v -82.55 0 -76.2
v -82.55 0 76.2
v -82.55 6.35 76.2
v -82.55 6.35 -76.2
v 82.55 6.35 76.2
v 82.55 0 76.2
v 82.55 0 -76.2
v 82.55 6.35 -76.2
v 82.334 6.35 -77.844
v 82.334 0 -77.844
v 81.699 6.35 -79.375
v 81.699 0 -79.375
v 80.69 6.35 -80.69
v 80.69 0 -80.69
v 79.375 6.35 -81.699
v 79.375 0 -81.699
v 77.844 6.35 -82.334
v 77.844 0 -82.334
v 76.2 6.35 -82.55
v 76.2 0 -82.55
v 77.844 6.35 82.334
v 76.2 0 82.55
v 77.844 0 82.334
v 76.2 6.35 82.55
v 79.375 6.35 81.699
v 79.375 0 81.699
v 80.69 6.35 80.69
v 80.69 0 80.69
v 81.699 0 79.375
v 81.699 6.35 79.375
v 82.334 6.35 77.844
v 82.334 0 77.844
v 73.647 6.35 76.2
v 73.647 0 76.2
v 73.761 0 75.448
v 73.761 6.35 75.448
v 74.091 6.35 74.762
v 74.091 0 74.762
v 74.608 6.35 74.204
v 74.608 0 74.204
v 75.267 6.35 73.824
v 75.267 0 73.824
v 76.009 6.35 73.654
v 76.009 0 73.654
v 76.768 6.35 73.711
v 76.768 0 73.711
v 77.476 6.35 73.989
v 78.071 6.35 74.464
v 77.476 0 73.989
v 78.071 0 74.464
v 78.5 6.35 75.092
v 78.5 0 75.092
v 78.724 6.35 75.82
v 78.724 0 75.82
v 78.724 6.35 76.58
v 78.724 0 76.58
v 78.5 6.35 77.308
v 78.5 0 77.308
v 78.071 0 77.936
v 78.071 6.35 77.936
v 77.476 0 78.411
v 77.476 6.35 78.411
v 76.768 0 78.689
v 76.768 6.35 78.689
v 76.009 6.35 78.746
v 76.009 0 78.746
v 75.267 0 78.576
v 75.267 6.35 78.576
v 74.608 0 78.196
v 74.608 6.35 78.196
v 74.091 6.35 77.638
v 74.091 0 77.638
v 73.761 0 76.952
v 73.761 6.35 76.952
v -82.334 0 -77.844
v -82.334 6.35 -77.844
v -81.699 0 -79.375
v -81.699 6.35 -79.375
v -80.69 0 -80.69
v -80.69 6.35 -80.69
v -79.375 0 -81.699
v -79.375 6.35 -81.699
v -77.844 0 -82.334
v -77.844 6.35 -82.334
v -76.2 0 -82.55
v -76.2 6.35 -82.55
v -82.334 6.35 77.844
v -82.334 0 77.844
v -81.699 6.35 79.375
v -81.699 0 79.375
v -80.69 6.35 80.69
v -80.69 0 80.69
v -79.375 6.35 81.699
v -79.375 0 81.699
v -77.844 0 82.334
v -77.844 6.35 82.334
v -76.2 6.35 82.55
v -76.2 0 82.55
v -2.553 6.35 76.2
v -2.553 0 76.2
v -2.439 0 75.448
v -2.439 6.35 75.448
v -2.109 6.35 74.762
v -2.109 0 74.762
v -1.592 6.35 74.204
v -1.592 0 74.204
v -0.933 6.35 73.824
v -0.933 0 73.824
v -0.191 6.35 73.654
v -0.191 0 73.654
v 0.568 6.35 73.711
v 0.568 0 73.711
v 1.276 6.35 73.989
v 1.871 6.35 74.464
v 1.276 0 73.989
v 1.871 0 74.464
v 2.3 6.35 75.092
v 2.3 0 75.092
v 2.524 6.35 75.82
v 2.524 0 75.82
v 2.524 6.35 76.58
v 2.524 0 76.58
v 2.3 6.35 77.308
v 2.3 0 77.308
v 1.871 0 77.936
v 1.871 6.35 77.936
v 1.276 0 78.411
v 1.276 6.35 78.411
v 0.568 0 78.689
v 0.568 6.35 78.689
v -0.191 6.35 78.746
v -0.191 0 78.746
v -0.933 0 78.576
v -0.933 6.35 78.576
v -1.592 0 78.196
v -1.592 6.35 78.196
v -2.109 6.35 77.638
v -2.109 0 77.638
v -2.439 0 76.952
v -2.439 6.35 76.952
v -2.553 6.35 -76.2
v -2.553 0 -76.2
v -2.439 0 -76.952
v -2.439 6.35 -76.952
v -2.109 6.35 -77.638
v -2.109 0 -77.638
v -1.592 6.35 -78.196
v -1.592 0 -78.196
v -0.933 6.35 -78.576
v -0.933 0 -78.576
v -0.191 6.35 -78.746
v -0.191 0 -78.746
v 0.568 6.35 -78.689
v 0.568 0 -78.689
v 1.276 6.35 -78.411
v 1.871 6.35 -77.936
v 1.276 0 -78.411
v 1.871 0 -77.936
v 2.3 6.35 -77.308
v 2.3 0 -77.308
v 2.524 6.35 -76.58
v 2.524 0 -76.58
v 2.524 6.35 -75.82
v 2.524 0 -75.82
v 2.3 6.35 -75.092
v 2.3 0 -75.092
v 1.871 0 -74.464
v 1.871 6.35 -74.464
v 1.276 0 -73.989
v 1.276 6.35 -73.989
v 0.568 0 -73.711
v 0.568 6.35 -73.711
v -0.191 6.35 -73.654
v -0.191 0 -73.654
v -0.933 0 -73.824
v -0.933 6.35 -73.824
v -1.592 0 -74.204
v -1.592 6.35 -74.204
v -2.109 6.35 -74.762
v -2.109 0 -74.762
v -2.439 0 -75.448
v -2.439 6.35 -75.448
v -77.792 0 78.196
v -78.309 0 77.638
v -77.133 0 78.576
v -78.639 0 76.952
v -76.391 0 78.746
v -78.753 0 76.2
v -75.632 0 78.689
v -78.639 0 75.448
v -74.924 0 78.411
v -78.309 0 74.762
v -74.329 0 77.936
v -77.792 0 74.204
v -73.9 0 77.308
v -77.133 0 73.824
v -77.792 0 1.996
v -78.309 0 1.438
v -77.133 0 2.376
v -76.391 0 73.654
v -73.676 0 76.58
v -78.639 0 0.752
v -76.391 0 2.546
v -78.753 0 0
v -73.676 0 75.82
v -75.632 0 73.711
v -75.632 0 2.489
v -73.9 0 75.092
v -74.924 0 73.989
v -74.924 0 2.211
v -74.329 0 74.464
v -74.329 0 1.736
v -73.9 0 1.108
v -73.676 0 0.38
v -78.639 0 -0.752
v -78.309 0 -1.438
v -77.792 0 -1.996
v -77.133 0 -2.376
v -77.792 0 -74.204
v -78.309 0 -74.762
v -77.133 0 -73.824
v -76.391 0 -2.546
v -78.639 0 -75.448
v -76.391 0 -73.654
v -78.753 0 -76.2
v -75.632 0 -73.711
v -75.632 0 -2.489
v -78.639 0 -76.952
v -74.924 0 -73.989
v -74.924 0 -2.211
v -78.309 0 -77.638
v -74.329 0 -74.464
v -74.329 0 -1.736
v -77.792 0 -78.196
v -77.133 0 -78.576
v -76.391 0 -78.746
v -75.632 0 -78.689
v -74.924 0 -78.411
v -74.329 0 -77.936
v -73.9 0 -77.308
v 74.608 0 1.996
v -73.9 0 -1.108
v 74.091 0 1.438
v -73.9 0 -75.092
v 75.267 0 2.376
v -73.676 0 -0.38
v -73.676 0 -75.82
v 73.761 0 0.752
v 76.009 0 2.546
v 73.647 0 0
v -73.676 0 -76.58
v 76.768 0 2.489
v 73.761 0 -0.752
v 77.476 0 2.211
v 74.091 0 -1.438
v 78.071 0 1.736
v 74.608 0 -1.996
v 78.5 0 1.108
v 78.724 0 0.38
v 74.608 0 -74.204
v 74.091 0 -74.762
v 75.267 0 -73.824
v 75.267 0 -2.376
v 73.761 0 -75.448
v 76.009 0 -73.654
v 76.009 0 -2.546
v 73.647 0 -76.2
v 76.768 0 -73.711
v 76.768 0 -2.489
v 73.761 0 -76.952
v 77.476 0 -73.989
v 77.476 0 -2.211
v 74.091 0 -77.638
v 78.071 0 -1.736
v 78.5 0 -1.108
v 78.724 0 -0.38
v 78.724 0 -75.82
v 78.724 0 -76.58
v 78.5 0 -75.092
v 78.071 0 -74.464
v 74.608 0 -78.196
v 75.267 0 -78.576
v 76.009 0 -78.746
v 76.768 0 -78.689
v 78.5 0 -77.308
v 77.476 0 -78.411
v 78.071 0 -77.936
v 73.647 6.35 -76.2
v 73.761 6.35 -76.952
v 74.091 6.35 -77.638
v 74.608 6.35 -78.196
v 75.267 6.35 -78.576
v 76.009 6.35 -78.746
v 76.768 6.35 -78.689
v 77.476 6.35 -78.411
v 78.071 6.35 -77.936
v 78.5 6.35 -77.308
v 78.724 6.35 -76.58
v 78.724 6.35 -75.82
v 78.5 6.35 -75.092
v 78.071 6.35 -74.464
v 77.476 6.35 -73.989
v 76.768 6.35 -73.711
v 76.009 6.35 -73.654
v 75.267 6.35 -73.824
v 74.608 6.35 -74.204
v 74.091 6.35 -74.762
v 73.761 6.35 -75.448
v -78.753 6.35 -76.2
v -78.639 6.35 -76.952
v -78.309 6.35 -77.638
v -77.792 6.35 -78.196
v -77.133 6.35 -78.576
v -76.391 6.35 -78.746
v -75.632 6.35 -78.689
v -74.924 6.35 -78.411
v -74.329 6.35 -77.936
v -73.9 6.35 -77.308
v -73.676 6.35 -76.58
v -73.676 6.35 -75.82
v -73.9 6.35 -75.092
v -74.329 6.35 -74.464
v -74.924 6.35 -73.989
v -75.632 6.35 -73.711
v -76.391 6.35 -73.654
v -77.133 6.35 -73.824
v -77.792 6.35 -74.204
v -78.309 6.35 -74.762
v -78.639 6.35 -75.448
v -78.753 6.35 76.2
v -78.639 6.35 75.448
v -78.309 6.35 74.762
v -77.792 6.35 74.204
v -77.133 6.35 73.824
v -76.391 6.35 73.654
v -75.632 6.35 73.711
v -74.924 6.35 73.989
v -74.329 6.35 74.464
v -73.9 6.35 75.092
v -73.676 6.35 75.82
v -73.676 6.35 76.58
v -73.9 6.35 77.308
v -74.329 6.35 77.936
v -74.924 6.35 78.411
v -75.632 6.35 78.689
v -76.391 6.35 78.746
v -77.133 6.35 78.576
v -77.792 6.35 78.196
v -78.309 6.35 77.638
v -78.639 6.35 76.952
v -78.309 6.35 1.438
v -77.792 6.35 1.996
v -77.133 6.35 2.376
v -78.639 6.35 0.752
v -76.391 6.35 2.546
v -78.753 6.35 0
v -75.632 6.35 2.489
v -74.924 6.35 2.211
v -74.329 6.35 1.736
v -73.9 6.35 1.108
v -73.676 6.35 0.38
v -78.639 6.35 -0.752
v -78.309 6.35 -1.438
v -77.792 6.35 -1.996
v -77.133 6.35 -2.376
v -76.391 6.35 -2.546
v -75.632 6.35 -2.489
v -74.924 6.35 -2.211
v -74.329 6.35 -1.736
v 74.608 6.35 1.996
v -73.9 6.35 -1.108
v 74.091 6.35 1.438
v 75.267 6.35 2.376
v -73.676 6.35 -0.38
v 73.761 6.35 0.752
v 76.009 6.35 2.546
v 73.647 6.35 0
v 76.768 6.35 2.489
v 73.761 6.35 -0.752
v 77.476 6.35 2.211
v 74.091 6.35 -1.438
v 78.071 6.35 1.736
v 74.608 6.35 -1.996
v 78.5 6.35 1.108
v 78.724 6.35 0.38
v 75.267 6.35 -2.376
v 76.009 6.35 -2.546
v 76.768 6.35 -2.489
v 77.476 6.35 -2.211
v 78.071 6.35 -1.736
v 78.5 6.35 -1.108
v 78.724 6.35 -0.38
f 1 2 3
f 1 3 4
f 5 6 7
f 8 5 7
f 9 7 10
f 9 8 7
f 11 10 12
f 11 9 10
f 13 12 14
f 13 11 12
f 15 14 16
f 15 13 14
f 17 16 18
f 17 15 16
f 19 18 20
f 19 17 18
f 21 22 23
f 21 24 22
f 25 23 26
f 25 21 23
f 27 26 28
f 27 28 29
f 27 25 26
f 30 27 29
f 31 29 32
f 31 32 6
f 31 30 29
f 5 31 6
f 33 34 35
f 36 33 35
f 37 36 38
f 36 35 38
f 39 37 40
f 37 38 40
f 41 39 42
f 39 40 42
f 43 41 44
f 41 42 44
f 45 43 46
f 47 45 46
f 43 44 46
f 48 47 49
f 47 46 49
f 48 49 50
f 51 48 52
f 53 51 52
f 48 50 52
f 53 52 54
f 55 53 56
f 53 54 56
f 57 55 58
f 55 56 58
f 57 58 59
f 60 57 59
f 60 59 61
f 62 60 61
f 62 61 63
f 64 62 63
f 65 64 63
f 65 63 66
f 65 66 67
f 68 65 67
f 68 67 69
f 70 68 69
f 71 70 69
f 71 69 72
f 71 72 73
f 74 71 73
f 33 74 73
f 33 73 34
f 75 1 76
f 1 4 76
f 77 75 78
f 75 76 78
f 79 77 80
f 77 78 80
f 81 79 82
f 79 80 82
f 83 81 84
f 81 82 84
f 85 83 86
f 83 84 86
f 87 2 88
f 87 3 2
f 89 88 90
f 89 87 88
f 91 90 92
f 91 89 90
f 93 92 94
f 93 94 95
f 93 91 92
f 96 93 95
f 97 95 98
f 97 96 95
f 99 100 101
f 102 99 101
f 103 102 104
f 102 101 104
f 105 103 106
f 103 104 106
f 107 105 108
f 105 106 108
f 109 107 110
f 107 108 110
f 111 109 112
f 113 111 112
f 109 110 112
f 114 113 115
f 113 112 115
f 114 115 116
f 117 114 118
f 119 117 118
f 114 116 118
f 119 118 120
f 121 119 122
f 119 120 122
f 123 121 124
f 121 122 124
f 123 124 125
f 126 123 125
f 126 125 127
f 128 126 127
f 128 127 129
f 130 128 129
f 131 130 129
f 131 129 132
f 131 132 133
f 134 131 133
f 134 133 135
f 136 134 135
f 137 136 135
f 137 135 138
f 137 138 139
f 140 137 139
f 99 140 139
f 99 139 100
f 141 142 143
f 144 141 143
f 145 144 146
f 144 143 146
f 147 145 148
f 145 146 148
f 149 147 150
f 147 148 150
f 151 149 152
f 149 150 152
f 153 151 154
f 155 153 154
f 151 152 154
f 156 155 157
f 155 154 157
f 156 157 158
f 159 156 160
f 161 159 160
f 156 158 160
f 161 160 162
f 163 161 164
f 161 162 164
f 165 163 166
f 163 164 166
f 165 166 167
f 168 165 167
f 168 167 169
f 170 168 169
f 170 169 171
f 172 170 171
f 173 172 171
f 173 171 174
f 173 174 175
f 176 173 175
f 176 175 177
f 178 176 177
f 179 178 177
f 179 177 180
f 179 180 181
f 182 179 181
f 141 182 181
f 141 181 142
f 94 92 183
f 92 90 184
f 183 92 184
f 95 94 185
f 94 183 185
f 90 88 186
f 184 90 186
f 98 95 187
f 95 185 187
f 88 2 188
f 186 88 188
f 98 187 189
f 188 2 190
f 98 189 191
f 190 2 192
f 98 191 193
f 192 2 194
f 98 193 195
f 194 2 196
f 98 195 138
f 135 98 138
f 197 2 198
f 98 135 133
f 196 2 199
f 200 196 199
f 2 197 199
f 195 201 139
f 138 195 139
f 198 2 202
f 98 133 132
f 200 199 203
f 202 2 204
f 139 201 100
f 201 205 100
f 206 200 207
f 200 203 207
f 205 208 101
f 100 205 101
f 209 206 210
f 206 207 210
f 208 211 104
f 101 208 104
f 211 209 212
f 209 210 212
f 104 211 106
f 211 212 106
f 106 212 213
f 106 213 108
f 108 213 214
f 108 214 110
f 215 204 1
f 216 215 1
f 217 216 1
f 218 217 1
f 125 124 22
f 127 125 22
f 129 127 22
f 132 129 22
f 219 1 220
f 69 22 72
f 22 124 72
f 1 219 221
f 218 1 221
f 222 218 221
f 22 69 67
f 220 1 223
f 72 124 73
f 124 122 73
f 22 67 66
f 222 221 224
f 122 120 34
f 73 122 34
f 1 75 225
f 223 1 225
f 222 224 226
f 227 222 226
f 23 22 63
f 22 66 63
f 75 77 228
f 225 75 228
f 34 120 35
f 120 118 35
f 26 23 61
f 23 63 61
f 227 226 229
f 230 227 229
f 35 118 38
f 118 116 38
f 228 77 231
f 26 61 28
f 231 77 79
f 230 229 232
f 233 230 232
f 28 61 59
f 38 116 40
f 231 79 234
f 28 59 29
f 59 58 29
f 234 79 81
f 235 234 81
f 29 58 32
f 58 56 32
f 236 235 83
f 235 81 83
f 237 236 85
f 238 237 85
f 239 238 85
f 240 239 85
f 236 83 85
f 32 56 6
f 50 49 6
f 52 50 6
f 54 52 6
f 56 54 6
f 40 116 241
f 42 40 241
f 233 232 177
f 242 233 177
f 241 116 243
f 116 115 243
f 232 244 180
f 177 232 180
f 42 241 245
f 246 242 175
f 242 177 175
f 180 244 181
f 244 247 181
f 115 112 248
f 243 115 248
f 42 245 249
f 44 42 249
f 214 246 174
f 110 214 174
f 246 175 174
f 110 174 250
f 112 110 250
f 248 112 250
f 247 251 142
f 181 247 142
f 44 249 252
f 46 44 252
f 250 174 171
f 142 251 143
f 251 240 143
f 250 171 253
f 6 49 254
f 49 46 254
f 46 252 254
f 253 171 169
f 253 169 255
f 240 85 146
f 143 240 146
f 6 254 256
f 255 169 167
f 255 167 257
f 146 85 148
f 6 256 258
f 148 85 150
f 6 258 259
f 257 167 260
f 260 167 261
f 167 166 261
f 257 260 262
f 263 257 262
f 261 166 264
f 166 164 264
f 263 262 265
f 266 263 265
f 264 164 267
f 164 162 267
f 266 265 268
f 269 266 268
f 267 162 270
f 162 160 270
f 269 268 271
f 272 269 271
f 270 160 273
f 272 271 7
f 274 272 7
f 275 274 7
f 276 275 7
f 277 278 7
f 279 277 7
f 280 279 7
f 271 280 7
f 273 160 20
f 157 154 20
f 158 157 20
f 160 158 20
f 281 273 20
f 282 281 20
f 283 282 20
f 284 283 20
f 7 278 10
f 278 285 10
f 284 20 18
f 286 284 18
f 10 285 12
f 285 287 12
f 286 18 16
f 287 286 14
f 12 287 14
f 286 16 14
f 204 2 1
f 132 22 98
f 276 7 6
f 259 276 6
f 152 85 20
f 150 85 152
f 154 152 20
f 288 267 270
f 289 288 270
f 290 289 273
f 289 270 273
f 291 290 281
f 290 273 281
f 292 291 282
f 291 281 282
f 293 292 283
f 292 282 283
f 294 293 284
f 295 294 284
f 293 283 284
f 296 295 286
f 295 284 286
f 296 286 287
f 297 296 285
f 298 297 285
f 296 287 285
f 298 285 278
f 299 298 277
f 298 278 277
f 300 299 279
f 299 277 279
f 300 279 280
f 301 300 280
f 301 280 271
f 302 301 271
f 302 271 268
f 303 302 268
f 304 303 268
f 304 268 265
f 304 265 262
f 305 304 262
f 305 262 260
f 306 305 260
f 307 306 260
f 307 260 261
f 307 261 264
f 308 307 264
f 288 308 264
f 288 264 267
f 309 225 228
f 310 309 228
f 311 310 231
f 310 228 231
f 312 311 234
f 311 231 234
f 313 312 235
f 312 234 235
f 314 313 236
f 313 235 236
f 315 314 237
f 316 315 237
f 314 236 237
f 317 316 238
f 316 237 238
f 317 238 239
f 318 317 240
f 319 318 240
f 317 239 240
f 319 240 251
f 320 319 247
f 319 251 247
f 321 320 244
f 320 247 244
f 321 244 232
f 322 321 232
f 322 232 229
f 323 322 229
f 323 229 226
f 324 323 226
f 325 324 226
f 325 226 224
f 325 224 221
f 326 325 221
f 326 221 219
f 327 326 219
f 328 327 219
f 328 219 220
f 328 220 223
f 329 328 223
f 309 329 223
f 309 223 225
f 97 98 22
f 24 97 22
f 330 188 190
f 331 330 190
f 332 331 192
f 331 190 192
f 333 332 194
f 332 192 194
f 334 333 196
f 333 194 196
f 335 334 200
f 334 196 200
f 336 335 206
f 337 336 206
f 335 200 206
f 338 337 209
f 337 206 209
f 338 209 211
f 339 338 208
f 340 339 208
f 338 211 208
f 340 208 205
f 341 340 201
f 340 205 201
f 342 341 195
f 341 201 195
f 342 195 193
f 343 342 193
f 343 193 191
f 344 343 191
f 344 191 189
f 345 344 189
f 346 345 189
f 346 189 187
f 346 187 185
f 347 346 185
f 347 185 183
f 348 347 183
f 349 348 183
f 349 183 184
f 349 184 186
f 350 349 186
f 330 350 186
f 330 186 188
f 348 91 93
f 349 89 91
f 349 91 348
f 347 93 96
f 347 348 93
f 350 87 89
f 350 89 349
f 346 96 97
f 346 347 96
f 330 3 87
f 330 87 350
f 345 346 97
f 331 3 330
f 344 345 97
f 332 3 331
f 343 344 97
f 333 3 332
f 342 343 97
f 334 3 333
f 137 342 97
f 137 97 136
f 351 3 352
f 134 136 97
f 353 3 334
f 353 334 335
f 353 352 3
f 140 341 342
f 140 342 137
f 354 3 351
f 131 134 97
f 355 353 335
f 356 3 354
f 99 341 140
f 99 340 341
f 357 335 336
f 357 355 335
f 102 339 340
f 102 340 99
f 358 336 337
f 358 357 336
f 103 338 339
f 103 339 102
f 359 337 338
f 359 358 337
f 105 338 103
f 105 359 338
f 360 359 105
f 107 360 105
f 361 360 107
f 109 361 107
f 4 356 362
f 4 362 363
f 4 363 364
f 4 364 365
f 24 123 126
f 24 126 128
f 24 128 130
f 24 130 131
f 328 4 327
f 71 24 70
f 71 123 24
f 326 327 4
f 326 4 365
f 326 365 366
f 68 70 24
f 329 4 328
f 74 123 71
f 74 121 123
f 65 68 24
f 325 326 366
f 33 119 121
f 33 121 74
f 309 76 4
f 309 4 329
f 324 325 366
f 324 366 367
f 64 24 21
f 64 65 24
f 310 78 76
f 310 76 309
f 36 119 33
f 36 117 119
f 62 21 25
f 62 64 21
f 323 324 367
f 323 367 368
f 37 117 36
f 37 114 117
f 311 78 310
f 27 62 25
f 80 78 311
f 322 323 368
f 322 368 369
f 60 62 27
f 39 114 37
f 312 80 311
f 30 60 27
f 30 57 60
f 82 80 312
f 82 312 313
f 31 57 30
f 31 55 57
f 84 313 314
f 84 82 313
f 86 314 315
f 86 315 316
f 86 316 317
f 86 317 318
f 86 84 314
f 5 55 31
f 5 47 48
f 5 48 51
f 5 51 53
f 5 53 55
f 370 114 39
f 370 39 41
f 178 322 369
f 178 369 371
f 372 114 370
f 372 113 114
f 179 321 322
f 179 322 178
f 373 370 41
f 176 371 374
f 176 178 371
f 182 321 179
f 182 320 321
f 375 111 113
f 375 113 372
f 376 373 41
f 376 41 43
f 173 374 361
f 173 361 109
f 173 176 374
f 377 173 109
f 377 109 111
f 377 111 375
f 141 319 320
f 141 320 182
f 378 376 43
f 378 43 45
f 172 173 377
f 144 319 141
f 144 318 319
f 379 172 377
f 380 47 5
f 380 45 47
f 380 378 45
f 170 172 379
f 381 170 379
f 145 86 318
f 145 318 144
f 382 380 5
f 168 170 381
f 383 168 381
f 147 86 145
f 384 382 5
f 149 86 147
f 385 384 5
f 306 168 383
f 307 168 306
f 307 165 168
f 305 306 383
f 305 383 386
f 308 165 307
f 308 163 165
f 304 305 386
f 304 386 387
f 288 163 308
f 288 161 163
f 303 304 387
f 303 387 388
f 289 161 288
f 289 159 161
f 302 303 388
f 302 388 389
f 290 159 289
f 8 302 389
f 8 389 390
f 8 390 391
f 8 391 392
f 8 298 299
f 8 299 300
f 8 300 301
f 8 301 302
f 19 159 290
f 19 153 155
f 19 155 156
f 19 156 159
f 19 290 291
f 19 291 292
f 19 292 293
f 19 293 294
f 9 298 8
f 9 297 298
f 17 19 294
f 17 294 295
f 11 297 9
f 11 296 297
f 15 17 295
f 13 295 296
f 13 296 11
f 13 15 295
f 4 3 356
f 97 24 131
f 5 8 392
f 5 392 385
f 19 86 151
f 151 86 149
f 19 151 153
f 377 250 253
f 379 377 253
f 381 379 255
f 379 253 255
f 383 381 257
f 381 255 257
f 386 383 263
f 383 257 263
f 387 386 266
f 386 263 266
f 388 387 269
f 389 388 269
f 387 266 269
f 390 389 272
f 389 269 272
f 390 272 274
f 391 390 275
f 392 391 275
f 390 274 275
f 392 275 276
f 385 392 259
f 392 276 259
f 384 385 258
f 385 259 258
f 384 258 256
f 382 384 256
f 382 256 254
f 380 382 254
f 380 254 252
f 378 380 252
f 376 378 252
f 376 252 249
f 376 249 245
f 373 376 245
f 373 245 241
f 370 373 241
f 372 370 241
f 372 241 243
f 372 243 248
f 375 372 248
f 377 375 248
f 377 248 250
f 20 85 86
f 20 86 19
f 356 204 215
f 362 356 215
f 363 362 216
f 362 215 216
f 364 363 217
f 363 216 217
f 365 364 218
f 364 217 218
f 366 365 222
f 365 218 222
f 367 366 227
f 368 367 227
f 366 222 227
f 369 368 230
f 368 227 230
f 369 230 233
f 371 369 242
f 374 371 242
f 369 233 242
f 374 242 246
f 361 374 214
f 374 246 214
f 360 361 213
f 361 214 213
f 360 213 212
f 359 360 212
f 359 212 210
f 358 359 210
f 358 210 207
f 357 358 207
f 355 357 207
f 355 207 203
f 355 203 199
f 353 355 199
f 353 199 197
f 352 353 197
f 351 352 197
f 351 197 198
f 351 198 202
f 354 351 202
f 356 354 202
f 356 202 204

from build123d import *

# Parameters (mm, degrees)
SKETCH1_W              = 165.1
SKETCH1_H              = 165.1
BOSS_EXTRUDE1_DEPTH    = 6.35
FILLET1_R              = 6.35
F_10_CLEARANCE_HOLE1_D = 5.1054


with BuildPart() as part:
    # Sketch1 → Boss-Extrude1 (new body)
    with BuildSketch(Plane(origin=(0, 0, 0), x_dir=(1, 0, 0), z_dir=(0, 1, 0))):
        Rectangle(SKETCH1_W, SKETCH1_H)
    extrude(amount=BOSS_EXTRUDE1_DEPTH)

    # Fillet1
    fillet1_edges = [part.edges().sort_by_distance(p)[0] for p in [
        (-82.55, 3.175, -82.55),
        (82.55, 3.175, -82.55),
        (82.55, 3.175, 82.55),
        (-82.55, 3.175, 82.55),
    ]]
    fillet(fillet1_edges, radius=FILLET1_R)

    # #10 Clearance Hole1 (through all)
    with Locations(Plane(origin=(0, 6.35, 0), x_dir=(1, 0, 0), z_dir=(0, 1, 0))):
        with Locations((-76.2, -76.2), (-76.2, 76.2), (76.2, 76.2), (76.2, -76.2), (0, 76.2), (0, -76.2), (-76.2, 0), (76.2, 0)):
            Hole(F_10_CLEARANCE_HOLE1_D / 2)


solid = part.part
